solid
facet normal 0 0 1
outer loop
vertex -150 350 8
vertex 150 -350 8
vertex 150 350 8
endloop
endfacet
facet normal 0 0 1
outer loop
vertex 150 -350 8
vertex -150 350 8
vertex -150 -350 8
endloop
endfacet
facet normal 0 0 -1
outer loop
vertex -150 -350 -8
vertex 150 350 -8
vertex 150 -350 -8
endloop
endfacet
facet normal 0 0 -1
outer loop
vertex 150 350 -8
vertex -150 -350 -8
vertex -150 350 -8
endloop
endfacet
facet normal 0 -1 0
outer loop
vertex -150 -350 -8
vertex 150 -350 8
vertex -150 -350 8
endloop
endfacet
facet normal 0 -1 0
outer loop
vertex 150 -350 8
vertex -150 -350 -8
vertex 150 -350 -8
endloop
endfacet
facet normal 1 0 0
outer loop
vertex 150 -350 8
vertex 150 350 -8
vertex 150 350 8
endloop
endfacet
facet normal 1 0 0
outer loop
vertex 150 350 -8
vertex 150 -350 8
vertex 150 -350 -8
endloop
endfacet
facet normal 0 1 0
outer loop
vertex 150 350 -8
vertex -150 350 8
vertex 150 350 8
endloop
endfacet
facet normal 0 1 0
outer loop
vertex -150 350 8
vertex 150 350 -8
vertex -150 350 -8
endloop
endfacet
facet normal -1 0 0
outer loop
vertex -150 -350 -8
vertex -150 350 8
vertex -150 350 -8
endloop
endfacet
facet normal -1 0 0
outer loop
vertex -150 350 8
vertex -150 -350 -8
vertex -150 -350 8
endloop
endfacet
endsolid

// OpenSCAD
module Doska() {
    cube([300,700,16],center=true);
}

Doska();
